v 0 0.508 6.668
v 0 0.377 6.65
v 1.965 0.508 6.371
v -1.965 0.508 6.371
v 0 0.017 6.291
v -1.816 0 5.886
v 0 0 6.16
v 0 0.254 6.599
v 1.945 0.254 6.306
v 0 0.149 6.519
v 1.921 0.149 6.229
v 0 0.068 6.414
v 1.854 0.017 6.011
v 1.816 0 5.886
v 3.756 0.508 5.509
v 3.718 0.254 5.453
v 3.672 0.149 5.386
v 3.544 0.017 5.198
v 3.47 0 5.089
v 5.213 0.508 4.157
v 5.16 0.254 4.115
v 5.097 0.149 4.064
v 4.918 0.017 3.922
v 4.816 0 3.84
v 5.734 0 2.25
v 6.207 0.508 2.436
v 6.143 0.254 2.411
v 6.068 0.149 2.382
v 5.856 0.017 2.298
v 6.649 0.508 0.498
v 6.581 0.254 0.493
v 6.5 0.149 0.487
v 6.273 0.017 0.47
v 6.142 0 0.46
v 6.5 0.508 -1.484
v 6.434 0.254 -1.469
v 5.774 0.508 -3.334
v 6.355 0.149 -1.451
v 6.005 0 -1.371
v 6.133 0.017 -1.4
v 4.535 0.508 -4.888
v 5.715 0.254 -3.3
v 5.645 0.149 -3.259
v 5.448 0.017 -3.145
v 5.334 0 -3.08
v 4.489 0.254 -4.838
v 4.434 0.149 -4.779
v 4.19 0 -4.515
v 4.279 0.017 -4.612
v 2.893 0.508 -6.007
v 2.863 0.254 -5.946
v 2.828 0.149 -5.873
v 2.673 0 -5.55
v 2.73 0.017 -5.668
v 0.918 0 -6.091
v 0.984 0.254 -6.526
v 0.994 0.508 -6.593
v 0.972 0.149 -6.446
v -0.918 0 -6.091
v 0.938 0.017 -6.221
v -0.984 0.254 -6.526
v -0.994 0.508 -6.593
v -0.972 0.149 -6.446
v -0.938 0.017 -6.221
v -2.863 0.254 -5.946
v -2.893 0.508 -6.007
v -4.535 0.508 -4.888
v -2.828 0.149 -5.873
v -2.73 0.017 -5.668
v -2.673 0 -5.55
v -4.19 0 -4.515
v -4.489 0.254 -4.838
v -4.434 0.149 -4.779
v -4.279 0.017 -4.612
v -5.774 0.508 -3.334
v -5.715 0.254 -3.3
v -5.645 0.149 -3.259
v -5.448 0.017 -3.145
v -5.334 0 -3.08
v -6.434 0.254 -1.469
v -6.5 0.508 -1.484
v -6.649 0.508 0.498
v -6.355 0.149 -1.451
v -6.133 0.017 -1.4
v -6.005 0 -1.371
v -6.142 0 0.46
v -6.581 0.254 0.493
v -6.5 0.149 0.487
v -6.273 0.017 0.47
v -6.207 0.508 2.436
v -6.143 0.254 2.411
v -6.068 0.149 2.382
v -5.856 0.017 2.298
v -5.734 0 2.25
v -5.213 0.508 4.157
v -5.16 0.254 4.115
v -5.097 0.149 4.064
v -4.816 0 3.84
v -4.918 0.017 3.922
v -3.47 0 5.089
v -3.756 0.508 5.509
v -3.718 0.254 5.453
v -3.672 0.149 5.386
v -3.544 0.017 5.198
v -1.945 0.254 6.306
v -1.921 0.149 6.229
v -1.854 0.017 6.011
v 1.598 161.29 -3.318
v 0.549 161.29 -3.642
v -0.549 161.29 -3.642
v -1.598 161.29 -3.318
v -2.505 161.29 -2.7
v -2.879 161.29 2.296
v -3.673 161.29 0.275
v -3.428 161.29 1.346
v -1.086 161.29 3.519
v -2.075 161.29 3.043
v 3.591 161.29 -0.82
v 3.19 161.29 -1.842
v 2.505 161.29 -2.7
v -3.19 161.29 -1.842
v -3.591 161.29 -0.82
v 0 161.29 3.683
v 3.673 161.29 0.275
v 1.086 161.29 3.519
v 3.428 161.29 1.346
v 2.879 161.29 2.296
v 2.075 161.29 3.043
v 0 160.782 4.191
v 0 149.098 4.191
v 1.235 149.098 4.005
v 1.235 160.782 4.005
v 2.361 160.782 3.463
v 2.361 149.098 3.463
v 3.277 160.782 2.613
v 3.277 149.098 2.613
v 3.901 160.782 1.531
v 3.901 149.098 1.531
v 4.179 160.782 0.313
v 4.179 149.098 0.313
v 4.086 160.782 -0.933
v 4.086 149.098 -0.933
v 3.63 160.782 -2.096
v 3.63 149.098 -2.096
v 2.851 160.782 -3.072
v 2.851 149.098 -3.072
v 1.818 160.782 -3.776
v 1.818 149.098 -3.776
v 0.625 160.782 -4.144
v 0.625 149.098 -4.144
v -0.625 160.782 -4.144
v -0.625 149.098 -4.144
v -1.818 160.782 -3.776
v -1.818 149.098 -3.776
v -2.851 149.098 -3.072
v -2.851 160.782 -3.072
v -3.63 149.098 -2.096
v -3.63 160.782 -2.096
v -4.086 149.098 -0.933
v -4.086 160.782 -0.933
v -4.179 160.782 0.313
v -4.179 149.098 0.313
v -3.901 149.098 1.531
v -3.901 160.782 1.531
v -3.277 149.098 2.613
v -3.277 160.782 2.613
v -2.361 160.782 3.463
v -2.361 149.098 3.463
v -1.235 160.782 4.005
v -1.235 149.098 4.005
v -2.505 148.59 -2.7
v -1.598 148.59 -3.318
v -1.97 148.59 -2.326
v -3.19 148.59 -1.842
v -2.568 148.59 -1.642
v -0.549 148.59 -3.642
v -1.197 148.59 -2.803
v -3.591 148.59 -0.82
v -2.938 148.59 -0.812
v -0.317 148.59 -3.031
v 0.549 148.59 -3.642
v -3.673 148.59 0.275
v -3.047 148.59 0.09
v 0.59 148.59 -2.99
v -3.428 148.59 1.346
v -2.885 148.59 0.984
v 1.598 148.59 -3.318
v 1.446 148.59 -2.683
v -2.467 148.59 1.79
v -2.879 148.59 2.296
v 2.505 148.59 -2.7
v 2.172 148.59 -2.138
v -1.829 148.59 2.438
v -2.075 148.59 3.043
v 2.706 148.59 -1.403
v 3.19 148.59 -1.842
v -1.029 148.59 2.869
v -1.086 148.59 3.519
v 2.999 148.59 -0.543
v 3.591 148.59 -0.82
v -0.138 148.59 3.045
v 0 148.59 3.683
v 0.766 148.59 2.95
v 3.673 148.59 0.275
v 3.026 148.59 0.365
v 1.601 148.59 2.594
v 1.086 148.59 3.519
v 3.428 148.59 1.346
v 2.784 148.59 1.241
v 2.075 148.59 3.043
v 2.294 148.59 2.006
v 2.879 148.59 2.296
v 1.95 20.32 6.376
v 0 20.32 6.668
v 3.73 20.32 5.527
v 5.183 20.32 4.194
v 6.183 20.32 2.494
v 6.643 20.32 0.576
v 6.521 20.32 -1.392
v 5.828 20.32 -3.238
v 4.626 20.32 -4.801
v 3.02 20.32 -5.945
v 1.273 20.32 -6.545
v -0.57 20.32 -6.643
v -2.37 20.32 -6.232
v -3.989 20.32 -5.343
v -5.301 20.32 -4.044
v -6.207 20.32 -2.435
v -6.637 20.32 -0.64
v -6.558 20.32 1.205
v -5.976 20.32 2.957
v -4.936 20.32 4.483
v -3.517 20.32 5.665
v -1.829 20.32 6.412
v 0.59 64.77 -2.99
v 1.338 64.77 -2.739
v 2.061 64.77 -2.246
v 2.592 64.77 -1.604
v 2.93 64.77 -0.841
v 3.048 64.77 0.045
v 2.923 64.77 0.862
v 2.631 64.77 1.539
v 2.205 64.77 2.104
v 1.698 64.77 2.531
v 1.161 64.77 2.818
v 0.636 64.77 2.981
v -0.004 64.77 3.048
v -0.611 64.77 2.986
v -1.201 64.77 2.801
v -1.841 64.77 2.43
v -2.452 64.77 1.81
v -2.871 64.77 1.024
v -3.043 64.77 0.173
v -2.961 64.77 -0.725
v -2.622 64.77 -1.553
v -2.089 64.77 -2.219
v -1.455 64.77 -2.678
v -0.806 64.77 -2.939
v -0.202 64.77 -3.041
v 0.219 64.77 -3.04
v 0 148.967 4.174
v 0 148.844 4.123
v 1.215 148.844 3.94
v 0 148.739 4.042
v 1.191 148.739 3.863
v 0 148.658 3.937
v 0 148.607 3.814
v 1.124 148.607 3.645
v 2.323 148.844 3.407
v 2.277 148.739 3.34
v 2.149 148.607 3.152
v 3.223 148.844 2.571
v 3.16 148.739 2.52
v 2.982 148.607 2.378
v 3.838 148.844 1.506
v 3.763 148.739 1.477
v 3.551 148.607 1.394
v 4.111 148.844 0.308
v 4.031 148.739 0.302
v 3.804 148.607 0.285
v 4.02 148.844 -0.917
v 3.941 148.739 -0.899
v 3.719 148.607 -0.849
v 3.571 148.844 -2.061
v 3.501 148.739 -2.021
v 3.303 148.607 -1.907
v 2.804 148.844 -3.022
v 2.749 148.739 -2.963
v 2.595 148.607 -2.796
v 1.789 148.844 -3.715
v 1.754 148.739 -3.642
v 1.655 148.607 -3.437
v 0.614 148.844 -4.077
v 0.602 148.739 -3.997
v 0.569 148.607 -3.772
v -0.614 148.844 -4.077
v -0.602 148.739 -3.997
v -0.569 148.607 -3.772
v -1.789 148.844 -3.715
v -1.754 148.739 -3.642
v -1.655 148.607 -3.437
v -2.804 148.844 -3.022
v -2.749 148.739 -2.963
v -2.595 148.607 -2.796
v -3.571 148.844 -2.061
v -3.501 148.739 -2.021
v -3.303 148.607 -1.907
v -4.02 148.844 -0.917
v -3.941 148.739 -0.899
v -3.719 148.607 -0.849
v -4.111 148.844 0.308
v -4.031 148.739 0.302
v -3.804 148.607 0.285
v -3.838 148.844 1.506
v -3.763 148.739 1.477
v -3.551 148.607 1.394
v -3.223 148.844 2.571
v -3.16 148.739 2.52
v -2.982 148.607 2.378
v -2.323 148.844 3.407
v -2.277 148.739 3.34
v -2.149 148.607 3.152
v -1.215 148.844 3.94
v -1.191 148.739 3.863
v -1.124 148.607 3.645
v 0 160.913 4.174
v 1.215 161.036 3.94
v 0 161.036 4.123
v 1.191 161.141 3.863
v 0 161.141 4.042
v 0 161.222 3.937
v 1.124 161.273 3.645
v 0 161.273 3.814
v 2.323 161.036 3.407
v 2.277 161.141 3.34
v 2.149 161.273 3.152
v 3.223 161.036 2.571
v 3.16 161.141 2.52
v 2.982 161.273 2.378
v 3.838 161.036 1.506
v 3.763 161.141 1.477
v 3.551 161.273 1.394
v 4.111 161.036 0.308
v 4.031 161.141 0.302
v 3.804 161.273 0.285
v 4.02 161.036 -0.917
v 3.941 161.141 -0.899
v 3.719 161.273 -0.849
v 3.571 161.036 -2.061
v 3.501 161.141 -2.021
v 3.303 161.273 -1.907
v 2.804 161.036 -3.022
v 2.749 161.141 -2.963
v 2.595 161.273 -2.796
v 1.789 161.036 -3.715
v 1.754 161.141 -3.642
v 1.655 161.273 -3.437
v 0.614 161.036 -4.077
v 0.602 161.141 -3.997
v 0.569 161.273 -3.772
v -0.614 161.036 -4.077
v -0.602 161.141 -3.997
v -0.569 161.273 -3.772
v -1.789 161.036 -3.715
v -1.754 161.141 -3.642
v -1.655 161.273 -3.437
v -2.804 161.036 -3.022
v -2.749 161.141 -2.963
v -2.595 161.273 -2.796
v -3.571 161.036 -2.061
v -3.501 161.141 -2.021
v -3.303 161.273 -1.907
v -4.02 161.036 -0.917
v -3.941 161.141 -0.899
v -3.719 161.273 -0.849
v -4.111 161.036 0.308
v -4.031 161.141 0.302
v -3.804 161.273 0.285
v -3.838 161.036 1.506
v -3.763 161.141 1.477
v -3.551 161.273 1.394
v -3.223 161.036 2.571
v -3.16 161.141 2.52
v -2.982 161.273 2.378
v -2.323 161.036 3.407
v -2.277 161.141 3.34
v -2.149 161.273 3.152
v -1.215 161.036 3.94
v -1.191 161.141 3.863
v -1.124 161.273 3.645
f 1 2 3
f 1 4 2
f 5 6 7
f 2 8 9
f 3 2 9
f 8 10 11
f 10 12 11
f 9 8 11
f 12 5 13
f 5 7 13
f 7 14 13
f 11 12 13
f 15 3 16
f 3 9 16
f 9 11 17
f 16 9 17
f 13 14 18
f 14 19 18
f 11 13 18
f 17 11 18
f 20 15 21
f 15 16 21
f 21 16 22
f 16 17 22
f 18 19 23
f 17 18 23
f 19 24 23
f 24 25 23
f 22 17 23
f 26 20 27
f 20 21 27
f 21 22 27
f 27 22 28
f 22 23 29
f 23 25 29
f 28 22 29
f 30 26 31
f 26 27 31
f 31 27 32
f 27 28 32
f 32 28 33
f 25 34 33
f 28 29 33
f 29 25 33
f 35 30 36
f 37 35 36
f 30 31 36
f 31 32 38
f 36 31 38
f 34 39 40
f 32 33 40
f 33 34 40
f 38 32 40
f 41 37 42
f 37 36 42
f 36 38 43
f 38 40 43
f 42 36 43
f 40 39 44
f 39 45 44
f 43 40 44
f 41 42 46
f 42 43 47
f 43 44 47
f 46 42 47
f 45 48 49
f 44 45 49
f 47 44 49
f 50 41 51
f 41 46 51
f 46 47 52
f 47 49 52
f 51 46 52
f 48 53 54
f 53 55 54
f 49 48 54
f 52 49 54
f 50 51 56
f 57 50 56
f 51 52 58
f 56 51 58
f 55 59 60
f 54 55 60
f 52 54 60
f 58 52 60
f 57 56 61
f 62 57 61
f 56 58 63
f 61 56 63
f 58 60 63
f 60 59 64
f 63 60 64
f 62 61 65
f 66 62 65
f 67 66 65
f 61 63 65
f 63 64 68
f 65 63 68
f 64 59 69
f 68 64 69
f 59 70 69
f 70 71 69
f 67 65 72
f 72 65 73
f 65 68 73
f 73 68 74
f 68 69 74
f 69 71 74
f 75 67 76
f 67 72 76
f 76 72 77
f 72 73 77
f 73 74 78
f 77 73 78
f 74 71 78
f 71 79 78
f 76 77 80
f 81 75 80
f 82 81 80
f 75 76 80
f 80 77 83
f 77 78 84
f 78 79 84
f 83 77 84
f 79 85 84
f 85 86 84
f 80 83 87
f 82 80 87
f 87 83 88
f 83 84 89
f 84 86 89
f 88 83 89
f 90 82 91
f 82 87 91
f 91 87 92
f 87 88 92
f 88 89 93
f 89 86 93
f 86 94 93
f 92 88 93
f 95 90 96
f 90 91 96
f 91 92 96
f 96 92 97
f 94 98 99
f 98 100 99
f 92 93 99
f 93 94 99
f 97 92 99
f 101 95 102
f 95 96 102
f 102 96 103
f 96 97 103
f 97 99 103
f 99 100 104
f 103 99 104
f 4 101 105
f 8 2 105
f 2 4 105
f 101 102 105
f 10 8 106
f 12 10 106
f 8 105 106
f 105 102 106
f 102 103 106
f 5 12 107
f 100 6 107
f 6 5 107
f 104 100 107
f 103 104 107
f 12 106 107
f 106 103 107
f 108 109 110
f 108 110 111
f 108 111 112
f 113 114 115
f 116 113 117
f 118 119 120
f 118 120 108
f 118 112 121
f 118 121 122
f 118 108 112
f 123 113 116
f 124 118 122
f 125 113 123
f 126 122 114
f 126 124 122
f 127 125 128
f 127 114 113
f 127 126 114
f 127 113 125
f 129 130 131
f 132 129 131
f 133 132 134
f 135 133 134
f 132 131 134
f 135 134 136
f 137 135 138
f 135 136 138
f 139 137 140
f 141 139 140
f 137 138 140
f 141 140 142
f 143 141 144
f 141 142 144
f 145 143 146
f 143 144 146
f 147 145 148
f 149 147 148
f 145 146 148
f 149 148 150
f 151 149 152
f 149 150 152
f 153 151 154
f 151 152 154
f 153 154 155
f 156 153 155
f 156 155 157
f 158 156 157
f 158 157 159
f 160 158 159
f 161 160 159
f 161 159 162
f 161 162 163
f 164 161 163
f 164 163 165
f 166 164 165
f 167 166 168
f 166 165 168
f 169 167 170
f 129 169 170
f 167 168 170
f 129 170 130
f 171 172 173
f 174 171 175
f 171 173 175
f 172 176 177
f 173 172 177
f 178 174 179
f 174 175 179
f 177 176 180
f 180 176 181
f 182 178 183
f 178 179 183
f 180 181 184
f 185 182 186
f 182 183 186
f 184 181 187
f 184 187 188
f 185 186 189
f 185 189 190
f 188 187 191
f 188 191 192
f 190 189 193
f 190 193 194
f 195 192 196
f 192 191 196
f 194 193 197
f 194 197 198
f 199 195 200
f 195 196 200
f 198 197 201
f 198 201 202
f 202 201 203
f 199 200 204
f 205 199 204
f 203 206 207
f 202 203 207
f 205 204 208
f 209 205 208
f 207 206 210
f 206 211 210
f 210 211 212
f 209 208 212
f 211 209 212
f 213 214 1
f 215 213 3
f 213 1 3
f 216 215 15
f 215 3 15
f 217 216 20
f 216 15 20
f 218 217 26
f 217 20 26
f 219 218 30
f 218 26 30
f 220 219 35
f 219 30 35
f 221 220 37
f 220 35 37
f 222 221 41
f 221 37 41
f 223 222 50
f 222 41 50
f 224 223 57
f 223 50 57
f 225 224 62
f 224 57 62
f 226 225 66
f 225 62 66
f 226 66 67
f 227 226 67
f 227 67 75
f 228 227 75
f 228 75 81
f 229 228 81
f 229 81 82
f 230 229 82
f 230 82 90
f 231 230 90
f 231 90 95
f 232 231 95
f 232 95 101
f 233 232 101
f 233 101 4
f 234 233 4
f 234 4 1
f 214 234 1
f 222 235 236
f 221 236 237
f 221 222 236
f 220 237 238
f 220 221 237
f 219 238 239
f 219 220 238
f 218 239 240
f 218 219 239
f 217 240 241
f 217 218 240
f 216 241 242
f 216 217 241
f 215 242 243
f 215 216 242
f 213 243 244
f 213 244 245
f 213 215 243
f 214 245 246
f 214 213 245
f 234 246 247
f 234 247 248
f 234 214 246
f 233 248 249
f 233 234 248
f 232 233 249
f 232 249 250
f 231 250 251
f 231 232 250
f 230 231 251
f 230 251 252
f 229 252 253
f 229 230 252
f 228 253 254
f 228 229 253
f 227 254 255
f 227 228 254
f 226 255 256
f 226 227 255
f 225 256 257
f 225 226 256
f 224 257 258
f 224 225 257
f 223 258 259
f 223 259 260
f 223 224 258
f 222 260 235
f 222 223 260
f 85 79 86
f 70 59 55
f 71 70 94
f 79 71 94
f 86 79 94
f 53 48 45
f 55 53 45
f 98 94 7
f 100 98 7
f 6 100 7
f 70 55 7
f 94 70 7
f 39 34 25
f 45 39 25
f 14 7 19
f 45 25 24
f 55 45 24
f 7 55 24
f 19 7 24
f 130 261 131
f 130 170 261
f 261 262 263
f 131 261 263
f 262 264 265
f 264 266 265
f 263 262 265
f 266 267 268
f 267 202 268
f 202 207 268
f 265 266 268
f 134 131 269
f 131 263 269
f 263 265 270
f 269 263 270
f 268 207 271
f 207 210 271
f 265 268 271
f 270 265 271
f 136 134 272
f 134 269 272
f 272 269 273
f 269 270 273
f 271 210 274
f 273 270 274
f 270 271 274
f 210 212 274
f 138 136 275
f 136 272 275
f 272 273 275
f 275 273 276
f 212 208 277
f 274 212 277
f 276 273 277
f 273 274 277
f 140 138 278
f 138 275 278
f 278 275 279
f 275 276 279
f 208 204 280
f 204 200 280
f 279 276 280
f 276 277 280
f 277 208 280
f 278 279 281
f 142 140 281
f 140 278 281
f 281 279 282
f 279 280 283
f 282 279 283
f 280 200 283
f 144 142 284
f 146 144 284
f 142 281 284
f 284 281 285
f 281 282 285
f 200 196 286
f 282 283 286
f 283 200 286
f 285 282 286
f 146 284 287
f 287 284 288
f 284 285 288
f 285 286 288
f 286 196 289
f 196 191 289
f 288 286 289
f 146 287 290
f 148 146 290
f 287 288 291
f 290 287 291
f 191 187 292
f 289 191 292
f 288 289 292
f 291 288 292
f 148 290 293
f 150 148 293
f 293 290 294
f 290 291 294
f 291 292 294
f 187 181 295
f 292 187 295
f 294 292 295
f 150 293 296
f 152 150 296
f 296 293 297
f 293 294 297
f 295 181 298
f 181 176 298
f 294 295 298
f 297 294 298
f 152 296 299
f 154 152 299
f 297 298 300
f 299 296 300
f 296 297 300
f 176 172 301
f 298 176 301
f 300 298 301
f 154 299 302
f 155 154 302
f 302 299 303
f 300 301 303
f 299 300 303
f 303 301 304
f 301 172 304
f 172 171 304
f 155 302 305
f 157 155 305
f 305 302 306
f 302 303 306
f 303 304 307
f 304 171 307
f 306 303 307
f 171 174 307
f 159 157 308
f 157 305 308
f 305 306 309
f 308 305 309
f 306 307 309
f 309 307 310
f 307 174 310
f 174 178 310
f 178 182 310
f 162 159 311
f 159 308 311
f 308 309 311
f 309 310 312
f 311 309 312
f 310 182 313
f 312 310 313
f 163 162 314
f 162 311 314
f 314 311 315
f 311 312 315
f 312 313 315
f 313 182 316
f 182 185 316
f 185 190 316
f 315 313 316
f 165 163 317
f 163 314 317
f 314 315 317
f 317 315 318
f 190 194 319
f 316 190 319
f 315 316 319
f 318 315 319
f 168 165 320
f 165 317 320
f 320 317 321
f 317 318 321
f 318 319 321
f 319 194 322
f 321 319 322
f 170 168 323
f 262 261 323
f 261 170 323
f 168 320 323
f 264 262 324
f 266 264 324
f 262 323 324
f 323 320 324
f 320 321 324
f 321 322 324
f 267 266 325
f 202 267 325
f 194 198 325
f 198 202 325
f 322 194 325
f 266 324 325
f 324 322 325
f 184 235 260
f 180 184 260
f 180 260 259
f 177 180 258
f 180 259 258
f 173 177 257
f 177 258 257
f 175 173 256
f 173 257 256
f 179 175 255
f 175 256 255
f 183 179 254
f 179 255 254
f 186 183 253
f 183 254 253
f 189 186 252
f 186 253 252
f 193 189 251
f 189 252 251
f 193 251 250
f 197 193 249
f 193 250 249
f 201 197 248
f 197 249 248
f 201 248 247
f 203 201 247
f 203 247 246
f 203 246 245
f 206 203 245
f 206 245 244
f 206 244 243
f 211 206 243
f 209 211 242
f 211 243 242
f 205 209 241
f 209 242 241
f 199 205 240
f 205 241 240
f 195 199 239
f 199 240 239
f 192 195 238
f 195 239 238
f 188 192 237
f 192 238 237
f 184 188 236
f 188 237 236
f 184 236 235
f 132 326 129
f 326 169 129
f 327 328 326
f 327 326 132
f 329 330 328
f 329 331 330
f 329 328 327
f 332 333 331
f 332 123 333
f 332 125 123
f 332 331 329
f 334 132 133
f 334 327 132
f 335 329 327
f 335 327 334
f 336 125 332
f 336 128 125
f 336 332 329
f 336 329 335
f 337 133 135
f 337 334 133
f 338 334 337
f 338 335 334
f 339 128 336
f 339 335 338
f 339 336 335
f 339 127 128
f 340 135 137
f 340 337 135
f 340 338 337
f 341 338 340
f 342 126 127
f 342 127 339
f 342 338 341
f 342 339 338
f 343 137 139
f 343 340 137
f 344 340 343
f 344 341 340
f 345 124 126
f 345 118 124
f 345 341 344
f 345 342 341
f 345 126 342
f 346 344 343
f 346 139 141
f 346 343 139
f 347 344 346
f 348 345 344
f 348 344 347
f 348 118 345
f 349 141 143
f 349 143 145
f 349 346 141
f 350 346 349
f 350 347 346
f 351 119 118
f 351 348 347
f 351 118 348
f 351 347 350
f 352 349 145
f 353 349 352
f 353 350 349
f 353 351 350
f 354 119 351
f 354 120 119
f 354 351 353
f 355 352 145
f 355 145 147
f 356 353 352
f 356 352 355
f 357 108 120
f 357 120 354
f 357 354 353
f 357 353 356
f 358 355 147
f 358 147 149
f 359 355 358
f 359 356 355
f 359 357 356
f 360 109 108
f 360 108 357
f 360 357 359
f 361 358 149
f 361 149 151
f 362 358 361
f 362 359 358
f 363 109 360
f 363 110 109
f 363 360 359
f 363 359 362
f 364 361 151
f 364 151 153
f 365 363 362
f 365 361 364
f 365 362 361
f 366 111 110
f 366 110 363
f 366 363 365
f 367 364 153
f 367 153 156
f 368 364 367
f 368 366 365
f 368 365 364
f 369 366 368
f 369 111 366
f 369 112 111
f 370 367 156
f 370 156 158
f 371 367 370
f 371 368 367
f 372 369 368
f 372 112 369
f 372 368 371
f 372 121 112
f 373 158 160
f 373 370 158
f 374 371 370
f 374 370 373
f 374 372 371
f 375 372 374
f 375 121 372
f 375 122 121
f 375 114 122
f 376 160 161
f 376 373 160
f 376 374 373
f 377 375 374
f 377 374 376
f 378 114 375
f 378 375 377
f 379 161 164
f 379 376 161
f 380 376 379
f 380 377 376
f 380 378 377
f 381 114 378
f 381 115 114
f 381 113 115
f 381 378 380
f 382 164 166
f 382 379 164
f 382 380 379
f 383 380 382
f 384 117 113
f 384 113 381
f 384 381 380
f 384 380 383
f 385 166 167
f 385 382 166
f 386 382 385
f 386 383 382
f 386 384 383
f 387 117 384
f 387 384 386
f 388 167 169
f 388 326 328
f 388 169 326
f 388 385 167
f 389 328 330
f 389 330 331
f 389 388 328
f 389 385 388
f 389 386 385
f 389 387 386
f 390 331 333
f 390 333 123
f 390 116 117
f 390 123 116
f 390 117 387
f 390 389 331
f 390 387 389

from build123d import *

# Parameters (mm, degrees)
SKETCH1_R           = 6.6675
BOSS_EXTRUDE1_DEPTH = 20.32
SKETCH4_R           = 3.048
BOSS_EXTRUDE2_DEPTH = 83.82
SKETCH5_R           = 4.191
BOSS_EXTRUDE3_DEPTH = 12.7
FILLET1_R           = 0.508


with BuildPart() as part:
    # Sketch1 → Boss-Extrude1 (new body)
    with BuildSketch(Plane(origin=(0, 0, 0), x_dir=(1, 0, 0), z_dir=(0, 1, 0))):
        with Locations(Location((0, 0, 0), (0, 0, 270))):
            Circle(SKETCH1_R)
    extrude(amount=BOSS_EXTRUDE1_DEPTH)

    # Loft1: read off the stored shape, not the designer's step
    # Loft1: loft between two sections, ruled curve by curve
    loft1_from = [
        Edge.make_bspline([(0.590355185, 64.77, -2.990281719), (6.570918622, 64.77, -1.809571349), (5.390208252, 64.77, 4.170992088), (-0.590355185, 64.77, 2.990281719), (-6.570918622, 64.77, 1.809571349), (-5.390208252, 64.77, -4.170992088), (0.590355185, 64.77, -2.990281719)], [0, 0, 0, 0, 0.5, 0.5, 0.5, 1, 1, 1, 1], 3, [1, 0.333333333, 0.333333333, 1, 0.333333333, 0.333333333, 1]),
    ]
    loft1_to = [
        Edge.make_bspline([(3.019513857, 20.32, -5.944585126), (14.908684109, 20.32, 0.094442589), (8.869656394, 20.32, 11.98361284), (-3.019513857, 20.32, 5.944585126), (-14.908684109, 20.32, -0.094442589), (-8.869656394, 20.32, -11.98361284), (3.019513857, 20.32, -5.944585126)], [0, 0, 0, 0, 0.5, 0.5, 0.5, 1, 1, 1, 1], 3, [1, 0.333333333, 0.333333333, 1, 0.333333333, 0.333333333, 1]),
    ]
    loft1 = Solid(Shell([*[Face.make_surface_from_curves(loft1_from[k], loft1_to[k]) for k in range(1)], Face(Wire(loft1_from)), Face(Wire(loft1_to))]))
    add(loft1)

    # Sketch4 → Boss-Extrude2 (add)
    with BuildSketch(Plane(origin=(0, 64.77, 0), x_dir=(1, 0, 0), z_dir=(0, 1, 0))):
        with Locations(Location((0, 0, 0), (0, 0, 78.832021496))):
            Circle(SKETCH4_R)
    extrude(amount=BOSS_EXTRUDE2_DEPTH)

    # Sketch5 → Boss-Extrude3 (add)
    with BuildSketch(Plane(origin=(0, 148.59, 0), x_dir=(1, 0, 0), z_dir=(0, 1, 0))):
        with Locations(Location((0, 0, 0), (0, 0, 270))):
            Circle(SKETCH5_R)
    extrude(amount=BOSS_EXTRUDE3_DEPTH)

    # Fillet1
    fillet1_edges = [part.edges().sort_by_distance(p)[0] for p in [
        (0, 148.59, -4.191),
        (0, 161.29, -4.191),
        (0, 0, -6.6675),
        (6.48425314, 20.32, 1.552423094),
    ]]
    fillet(fillet1_edges, radius=FILLET1_R)


solid = part.part
